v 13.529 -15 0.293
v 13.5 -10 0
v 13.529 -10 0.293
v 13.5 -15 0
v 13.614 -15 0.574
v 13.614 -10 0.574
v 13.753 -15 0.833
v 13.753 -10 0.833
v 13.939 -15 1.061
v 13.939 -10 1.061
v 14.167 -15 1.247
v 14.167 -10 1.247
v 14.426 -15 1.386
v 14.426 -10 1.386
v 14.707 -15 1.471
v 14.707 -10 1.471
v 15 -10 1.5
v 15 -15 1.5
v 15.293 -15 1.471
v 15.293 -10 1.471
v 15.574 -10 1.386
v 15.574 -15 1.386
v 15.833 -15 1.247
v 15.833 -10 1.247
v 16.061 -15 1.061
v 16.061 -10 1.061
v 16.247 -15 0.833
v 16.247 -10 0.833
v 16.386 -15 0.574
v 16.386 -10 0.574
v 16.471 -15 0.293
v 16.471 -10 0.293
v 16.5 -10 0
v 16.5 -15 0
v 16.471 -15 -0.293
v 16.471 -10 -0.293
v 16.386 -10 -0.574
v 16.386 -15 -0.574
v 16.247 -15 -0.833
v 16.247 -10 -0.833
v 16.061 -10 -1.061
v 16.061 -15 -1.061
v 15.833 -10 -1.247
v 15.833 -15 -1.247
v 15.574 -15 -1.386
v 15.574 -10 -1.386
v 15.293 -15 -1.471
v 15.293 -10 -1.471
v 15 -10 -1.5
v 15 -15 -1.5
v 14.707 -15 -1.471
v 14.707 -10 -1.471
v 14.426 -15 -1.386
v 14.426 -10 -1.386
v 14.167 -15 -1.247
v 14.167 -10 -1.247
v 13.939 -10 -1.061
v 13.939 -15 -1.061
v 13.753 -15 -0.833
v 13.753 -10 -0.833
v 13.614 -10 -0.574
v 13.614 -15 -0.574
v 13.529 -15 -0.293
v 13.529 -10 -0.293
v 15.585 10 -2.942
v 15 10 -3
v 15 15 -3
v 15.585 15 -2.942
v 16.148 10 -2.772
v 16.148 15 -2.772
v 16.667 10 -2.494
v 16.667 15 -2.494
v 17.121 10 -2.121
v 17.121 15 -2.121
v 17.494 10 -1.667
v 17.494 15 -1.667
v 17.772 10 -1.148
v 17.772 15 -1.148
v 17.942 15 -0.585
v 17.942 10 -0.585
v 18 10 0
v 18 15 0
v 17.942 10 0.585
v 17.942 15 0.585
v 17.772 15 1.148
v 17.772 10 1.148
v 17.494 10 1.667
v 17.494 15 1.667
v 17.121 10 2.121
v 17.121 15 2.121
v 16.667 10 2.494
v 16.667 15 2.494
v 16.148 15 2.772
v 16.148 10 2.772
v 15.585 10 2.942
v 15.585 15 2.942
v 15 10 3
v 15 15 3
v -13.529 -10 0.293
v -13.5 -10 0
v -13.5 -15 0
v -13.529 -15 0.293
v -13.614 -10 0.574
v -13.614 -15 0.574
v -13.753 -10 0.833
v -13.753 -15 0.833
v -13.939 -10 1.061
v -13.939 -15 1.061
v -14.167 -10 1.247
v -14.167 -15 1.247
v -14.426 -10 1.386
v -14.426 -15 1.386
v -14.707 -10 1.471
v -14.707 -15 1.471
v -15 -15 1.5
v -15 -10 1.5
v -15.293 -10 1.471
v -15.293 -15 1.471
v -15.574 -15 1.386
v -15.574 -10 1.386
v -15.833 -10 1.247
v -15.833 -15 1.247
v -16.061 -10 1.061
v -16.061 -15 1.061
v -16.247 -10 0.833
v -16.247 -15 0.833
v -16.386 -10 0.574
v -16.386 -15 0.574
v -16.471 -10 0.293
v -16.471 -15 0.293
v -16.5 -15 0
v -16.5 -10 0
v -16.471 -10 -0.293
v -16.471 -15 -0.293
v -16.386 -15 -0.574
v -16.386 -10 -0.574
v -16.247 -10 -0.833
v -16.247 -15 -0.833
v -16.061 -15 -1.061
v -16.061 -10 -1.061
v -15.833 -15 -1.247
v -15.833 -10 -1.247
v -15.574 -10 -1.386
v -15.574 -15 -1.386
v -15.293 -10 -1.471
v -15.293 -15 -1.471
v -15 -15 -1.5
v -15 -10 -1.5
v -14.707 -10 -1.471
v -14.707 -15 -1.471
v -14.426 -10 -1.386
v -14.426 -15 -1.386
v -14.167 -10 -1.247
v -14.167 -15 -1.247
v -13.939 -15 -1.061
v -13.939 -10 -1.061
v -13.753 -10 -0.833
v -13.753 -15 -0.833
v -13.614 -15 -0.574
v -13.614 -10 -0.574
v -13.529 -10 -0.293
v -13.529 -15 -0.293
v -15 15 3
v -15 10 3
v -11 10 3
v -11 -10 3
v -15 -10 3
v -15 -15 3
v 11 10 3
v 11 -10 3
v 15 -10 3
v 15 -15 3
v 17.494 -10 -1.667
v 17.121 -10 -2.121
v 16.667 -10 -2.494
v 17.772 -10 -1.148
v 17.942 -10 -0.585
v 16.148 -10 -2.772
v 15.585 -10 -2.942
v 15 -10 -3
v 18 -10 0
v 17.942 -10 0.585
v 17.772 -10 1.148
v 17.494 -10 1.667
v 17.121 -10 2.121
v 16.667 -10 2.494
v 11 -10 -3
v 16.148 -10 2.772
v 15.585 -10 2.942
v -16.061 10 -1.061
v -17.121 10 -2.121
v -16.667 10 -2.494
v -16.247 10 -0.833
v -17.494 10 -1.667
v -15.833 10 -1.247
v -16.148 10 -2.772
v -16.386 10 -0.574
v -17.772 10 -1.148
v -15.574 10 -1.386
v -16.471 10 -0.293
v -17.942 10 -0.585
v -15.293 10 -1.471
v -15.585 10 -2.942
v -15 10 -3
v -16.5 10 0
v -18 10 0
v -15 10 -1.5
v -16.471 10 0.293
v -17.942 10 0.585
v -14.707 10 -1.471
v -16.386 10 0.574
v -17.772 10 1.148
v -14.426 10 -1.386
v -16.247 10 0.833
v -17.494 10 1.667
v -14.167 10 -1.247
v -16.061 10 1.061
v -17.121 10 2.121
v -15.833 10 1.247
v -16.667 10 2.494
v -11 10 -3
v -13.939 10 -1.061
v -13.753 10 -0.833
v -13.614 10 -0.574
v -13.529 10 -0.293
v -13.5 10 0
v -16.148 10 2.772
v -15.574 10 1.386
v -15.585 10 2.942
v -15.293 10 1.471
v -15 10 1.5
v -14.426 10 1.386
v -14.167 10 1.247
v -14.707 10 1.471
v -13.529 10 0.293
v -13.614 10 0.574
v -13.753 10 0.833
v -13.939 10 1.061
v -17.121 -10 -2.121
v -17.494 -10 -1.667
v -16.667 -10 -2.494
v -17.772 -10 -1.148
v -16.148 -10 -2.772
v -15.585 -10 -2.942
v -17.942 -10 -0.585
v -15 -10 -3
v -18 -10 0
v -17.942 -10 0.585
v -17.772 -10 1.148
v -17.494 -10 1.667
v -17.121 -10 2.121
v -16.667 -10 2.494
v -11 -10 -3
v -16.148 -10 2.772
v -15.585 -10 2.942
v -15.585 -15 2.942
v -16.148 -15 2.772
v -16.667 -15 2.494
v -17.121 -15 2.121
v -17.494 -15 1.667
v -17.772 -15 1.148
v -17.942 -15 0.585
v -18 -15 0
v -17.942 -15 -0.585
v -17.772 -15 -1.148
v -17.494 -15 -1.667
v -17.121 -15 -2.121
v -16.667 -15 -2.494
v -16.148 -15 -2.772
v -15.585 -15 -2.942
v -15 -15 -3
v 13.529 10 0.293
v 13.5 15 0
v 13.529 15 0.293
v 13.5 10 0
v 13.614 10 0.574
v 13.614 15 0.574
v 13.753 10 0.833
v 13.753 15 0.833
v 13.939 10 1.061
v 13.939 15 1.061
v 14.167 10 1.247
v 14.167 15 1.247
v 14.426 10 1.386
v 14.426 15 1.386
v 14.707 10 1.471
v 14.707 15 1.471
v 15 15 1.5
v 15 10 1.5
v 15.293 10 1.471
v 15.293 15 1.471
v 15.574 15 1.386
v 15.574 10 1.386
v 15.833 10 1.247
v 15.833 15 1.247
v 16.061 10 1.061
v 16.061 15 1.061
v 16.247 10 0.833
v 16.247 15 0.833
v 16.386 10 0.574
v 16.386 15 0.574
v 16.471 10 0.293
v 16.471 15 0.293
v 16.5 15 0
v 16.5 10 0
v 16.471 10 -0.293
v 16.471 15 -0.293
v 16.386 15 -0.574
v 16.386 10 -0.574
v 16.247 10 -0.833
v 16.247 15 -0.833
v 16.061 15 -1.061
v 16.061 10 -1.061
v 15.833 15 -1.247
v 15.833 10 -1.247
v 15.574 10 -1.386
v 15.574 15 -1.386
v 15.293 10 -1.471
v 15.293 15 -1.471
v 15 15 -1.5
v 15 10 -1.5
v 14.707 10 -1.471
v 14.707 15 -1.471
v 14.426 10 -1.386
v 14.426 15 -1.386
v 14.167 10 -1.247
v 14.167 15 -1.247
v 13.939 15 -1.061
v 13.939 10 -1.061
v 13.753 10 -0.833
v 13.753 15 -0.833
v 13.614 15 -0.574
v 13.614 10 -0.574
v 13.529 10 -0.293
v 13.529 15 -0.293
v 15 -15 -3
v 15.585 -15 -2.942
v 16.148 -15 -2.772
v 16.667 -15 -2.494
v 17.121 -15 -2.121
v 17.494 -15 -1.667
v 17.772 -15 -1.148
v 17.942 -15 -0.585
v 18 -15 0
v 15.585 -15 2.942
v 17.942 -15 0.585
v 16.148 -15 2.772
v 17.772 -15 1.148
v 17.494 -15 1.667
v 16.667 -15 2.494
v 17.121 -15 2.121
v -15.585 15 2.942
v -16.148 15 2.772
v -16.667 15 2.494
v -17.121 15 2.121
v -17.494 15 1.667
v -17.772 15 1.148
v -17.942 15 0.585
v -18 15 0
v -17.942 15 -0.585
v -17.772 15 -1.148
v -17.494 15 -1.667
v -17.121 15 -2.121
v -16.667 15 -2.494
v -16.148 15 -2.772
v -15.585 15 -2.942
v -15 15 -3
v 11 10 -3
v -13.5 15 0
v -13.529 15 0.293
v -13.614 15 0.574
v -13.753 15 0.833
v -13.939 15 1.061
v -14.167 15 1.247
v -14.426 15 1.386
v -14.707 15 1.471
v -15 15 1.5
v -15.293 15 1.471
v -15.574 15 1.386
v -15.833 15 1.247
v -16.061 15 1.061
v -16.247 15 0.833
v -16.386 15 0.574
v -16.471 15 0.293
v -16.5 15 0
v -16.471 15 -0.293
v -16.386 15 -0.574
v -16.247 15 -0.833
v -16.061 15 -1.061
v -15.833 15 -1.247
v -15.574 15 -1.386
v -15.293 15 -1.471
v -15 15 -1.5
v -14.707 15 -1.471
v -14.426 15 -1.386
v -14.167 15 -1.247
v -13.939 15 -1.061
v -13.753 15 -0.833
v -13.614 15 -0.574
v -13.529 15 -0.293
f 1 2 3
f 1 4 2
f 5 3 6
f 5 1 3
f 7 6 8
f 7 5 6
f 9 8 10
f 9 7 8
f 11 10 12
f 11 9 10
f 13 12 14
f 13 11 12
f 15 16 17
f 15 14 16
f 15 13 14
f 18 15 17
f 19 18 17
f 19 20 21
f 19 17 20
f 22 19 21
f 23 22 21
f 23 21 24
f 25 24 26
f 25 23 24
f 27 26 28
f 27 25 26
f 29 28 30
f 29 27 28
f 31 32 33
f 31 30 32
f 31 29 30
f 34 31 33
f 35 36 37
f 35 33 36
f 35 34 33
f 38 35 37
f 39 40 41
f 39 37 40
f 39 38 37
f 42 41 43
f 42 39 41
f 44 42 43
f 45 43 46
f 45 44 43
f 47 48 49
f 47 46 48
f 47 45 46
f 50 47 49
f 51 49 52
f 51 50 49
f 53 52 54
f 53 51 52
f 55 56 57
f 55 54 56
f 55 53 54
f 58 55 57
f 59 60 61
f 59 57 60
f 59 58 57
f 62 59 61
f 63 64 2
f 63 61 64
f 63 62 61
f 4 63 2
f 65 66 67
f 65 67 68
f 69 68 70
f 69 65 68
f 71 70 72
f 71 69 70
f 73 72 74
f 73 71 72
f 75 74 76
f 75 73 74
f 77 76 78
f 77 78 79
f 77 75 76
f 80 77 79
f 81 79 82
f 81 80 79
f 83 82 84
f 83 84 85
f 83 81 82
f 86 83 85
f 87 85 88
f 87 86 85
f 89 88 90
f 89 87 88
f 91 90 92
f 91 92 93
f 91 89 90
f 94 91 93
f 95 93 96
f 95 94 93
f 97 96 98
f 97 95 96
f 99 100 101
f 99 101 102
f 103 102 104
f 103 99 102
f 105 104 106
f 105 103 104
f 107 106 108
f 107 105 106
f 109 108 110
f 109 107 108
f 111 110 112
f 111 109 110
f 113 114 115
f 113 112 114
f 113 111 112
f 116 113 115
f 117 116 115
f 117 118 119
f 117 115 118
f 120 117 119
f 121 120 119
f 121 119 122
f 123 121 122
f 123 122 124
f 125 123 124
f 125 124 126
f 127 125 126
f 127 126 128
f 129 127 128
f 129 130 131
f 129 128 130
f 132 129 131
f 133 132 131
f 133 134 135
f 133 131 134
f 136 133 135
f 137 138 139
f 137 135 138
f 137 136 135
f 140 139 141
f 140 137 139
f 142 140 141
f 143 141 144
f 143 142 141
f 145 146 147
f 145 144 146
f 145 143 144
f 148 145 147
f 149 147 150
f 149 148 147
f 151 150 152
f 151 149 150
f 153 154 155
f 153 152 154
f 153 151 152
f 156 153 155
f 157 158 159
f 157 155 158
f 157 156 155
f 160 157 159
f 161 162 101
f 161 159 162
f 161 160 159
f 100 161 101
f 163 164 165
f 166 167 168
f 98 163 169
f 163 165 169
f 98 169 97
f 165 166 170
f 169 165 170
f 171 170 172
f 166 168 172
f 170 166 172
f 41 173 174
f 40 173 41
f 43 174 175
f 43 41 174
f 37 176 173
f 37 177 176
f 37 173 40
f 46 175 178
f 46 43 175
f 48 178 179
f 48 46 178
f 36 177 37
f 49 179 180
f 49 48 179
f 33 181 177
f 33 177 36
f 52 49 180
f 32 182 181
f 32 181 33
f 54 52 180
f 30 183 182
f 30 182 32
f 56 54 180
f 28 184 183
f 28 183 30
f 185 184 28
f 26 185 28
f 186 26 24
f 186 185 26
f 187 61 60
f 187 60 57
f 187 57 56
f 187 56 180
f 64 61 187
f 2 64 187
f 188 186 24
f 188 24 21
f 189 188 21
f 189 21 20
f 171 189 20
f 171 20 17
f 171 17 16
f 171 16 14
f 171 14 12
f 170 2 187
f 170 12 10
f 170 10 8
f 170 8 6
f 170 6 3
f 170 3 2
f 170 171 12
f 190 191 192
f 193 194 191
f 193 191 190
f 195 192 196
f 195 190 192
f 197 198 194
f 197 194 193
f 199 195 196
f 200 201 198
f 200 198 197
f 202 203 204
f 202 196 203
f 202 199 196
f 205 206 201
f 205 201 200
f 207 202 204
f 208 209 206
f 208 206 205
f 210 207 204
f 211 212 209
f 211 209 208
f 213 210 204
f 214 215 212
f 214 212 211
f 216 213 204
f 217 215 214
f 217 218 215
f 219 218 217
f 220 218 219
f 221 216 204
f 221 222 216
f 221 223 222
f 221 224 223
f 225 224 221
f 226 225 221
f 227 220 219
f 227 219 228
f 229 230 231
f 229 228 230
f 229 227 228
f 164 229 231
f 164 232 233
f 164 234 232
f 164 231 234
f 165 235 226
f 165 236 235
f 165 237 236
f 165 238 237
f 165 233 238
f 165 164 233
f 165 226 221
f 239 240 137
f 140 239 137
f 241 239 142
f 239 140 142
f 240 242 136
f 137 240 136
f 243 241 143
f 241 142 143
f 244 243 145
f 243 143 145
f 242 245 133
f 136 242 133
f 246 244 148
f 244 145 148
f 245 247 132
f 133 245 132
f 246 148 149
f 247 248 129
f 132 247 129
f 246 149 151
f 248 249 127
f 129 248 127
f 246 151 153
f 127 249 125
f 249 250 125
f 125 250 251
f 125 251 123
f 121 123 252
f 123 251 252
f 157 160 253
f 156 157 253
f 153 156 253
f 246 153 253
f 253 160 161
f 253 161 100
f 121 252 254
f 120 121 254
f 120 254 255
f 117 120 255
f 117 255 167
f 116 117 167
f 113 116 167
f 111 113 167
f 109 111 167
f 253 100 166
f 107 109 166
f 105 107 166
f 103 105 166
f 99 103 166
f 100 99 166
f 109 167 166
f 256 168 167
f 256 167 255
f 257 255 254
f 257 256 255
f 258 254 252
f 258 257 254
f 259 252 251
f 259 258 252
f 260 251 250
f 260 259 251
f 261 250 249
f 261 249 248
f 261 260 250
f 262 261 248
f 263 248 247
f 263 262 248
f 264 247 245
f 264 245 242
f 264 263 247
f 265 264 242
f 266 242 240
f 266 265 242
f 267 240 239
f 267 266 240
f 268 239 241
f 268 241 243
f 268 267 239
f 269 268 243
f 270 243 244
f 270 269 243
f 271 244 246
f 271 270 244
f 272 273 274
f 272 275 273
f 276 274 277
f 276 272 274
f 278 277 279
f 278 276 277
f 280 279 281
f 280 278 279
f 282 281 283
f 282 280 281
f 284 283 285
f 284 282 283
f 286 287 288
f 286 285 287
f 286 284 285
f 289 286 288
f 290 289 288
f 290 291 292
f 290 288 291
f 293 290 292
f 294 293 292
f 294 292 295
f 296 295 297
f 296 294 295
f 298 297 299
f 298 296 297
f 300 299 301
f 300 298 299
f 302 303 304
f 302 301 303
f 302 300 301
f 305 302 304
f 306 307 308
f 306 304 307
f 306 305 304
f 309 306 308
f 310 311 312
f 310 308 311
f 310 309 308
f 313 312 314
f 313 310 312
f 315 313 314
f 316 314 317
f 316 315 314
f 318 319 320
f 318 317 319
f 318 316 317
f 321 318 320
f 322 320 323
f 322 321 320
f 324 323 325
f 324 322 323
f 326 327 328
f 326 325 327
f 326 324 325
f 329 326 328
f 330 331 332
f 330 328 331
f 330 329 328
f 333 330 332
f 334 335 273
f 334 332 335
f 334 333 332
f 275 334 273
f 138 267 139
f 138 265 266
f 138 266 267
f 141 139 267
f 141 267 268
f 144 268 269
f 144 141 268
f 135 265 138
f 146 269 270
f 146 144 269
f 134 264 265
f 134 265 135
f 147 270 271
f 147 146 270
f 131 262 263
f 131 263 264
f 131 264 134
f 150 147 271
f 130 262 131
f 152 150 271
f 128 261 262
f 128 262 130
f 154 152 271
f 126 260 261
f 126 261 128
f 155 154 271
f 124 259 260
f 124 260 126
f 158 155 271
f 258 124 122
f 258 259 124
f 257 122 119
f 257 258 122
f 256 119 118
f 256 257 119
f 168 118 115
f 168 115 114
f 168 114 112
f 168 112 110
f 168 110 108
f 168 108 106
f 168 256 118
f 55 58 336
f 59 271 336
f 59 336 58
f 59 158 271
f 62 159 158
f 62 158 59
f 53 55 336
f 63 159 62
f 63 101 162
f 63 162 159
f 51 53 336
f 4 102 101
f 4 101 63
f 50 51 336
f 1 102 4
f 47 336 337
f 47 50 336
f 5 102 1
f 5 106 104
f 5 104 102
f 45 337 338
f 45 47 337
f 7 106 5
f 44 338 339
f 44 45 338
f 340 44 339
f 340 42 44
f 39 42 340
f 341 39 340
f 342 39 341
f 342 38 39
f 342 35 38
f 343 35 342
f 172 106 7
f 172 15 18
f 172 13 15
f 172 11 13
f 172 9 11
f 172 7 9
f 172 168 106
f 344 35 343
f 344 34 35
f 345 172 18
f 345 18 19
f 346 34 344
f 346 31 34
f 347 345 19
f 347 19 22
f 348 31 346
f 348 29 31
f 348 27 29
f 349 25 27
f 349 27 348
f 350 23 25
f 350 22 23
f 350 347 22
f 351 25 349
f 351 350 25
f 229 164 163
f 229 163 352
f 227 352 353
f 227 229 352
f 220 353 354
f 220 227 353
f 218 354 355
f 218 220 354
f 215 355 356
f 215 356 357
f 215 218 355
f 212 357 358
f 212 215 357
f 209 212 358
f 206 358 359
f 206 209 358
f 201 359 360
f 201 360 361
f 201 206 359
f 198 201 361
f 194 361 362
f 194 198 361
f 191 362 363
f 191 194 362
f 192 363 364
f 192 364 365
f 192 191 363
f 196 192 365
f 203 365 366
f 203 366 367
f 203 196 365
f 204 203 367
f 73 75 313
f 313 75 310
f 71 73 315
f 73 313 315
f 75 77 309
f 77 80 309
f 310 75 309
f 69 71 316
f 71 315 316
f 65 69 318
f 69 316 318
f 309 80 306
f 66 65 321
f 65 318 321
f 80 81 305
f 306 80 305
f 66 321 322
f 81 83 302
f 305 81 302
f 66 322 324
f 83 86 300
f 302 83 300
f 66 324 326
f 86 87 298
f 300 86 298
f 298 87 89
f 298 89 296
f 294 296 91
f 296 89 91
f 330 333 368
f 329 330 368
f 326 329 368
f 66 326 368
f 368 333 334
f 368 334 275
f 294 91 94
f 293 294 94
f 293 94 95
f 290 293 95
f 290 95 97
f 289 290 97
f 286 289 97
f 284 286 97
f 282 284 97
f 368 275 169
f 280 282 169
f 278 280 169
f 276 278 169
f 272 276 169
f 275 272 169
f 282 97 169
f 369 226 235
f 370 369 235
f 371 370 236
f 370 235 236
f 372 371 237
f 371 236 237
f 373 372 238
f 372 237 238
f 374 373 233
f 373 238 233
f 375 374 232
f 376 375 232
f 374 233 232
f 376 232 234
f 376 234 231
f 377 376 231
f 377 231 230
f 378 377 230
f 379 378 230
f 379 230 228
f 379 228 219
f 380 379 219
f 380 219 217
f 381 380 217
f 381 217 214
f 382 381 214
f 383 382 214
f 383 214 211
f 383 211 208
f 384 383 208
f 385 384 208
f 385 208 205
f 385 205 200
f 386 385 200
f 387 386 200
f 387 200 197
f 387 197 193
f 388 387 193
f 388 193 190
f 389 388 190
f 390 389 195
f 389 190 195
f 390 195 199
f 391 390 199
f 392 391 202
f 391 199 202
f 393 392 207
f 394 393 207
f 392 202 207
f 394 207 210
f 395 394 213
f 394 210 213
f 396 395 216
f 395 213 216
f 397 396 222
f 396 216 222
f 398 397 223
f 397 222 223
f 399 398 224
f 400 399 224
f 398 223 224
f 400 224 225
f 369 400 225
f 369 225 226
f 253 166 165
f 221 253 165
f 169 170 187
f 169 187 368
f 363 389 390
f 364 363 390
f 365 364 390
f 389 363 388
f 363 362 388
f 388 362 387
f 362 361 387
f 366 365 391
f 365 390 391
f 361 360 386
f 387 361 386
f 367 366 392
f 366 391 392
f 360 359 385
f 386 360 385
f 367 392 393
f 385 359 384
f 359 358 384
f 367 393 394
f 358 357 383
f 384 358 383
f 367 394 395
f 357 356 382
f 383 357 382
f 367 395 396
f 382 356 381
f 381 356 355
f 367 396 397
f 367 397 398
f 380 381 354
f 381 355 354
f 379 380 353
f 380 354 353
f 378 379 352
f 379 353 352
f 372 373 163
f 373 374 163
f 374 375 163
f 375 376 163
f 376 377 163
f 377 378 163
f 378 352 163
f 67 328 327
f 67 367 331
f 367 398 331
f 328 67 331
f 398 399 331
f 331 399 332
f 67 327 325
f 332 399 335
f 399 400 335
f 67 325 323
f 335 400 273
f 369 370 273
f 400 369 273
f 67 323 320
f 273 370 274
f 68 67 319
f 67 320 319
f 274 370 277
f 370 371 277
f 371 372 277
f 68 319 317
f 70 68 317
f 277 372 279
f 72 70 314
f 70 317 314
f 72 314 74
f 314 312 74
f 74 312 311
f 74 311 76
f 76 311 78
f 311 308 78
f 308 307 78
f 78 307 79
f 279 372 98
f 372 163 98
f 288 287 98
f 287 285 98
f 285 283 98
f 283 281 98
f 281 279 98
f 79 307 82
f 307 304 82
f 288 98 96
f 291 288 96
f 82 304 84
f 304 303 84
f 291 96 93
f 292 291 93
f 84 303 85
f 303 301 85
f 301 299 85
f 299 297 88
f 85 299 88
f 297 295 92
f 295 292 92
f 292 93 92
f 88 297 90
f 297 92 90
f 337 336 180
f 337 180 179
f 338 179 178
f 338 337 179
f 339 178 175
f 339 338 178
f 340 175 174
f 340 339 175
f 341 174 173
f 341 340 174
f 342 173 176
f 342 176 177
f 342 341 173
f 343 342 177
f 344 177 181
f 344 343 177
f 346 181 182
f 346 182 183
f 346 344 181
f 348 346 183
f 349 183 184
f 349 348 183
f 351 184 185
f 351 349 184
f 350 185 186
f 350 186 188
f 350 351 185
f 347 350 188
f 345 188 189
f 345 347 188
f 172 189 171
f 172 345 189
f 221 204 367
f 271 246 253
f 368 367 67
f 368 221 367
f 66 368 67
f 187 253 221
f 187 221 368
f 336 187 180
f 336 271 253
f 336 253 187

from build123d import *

# Parameters (mm, degrees)
PAD_DEPTH            = 15
SKETCH001_W          = 7
SKETCH001_H          = 20
POCKET_DEPTH         = 97.489094
POCKET_DEPTH_BACK    = 97.489094
SKETCH002_R          = 1.5
POCKET001_DEPTH      = 109.489094
POCKET001_DEPTH_BACK = 109.489094


with BuildPart() as part:
    # Sketch (on DatumPlane) → Pad (new body, symmetric)
    with BuildSketch(Plane.XZ):
        with BuildLine():
            ThreePointArc((-15, 3), (-18, 0), (-15, -3))
            Line((-15, -3), (15, -3))
            ThreePointArc((15, -3), (18, 0), (15, 3))
            Line((-15, 3), (15, 3))
        make_face()
    extrude(amount=PAD_DEPTH, both=True)

    # Sketch001 (on DatumPlane) → Pocket (cut, two sides)
    with BuildSketch(Plane.XY) as pocket_sk:
        with Locations((-14.5, 0)):
            Rectangle(SKETCH001_W, SKETCH001_H)
    pocket = extrude(amount=-POCKET_DEPTH, mode=Mode.SUBTRACT) + extrude(pocket_sk.sketch, amount=POCKET_DEPTH_BACK, mode=Mode.SUBTRACT)

    # Mirrored: Pocket across YZ
    add(pocket.mirror(Plane.YZ), mode=Mode.SUBTRACT)

    # Sketch002 (on DatumPlane) → Pocket001 (cut, two sides)
    with BuildSketch(Plane.XZ) as pocket001_sk:
        with Locations((-15, 0)):
            Circle(SKETCH002_R)
    pocket001 = extrude(amount=-POCKET001_DEPTH, mode=Mode.SUBTRACT) + extrude(pocket001_sk.sketch, amount=POCKET001_DEPTH_BACK, mode=Mode.SUBTRACT)

    # Mirrored001: Pocket001 across YZ
    add(pocket001.mirror(Plane.YZ), mode=Mode.SUBTRACT)


solid = part.part
